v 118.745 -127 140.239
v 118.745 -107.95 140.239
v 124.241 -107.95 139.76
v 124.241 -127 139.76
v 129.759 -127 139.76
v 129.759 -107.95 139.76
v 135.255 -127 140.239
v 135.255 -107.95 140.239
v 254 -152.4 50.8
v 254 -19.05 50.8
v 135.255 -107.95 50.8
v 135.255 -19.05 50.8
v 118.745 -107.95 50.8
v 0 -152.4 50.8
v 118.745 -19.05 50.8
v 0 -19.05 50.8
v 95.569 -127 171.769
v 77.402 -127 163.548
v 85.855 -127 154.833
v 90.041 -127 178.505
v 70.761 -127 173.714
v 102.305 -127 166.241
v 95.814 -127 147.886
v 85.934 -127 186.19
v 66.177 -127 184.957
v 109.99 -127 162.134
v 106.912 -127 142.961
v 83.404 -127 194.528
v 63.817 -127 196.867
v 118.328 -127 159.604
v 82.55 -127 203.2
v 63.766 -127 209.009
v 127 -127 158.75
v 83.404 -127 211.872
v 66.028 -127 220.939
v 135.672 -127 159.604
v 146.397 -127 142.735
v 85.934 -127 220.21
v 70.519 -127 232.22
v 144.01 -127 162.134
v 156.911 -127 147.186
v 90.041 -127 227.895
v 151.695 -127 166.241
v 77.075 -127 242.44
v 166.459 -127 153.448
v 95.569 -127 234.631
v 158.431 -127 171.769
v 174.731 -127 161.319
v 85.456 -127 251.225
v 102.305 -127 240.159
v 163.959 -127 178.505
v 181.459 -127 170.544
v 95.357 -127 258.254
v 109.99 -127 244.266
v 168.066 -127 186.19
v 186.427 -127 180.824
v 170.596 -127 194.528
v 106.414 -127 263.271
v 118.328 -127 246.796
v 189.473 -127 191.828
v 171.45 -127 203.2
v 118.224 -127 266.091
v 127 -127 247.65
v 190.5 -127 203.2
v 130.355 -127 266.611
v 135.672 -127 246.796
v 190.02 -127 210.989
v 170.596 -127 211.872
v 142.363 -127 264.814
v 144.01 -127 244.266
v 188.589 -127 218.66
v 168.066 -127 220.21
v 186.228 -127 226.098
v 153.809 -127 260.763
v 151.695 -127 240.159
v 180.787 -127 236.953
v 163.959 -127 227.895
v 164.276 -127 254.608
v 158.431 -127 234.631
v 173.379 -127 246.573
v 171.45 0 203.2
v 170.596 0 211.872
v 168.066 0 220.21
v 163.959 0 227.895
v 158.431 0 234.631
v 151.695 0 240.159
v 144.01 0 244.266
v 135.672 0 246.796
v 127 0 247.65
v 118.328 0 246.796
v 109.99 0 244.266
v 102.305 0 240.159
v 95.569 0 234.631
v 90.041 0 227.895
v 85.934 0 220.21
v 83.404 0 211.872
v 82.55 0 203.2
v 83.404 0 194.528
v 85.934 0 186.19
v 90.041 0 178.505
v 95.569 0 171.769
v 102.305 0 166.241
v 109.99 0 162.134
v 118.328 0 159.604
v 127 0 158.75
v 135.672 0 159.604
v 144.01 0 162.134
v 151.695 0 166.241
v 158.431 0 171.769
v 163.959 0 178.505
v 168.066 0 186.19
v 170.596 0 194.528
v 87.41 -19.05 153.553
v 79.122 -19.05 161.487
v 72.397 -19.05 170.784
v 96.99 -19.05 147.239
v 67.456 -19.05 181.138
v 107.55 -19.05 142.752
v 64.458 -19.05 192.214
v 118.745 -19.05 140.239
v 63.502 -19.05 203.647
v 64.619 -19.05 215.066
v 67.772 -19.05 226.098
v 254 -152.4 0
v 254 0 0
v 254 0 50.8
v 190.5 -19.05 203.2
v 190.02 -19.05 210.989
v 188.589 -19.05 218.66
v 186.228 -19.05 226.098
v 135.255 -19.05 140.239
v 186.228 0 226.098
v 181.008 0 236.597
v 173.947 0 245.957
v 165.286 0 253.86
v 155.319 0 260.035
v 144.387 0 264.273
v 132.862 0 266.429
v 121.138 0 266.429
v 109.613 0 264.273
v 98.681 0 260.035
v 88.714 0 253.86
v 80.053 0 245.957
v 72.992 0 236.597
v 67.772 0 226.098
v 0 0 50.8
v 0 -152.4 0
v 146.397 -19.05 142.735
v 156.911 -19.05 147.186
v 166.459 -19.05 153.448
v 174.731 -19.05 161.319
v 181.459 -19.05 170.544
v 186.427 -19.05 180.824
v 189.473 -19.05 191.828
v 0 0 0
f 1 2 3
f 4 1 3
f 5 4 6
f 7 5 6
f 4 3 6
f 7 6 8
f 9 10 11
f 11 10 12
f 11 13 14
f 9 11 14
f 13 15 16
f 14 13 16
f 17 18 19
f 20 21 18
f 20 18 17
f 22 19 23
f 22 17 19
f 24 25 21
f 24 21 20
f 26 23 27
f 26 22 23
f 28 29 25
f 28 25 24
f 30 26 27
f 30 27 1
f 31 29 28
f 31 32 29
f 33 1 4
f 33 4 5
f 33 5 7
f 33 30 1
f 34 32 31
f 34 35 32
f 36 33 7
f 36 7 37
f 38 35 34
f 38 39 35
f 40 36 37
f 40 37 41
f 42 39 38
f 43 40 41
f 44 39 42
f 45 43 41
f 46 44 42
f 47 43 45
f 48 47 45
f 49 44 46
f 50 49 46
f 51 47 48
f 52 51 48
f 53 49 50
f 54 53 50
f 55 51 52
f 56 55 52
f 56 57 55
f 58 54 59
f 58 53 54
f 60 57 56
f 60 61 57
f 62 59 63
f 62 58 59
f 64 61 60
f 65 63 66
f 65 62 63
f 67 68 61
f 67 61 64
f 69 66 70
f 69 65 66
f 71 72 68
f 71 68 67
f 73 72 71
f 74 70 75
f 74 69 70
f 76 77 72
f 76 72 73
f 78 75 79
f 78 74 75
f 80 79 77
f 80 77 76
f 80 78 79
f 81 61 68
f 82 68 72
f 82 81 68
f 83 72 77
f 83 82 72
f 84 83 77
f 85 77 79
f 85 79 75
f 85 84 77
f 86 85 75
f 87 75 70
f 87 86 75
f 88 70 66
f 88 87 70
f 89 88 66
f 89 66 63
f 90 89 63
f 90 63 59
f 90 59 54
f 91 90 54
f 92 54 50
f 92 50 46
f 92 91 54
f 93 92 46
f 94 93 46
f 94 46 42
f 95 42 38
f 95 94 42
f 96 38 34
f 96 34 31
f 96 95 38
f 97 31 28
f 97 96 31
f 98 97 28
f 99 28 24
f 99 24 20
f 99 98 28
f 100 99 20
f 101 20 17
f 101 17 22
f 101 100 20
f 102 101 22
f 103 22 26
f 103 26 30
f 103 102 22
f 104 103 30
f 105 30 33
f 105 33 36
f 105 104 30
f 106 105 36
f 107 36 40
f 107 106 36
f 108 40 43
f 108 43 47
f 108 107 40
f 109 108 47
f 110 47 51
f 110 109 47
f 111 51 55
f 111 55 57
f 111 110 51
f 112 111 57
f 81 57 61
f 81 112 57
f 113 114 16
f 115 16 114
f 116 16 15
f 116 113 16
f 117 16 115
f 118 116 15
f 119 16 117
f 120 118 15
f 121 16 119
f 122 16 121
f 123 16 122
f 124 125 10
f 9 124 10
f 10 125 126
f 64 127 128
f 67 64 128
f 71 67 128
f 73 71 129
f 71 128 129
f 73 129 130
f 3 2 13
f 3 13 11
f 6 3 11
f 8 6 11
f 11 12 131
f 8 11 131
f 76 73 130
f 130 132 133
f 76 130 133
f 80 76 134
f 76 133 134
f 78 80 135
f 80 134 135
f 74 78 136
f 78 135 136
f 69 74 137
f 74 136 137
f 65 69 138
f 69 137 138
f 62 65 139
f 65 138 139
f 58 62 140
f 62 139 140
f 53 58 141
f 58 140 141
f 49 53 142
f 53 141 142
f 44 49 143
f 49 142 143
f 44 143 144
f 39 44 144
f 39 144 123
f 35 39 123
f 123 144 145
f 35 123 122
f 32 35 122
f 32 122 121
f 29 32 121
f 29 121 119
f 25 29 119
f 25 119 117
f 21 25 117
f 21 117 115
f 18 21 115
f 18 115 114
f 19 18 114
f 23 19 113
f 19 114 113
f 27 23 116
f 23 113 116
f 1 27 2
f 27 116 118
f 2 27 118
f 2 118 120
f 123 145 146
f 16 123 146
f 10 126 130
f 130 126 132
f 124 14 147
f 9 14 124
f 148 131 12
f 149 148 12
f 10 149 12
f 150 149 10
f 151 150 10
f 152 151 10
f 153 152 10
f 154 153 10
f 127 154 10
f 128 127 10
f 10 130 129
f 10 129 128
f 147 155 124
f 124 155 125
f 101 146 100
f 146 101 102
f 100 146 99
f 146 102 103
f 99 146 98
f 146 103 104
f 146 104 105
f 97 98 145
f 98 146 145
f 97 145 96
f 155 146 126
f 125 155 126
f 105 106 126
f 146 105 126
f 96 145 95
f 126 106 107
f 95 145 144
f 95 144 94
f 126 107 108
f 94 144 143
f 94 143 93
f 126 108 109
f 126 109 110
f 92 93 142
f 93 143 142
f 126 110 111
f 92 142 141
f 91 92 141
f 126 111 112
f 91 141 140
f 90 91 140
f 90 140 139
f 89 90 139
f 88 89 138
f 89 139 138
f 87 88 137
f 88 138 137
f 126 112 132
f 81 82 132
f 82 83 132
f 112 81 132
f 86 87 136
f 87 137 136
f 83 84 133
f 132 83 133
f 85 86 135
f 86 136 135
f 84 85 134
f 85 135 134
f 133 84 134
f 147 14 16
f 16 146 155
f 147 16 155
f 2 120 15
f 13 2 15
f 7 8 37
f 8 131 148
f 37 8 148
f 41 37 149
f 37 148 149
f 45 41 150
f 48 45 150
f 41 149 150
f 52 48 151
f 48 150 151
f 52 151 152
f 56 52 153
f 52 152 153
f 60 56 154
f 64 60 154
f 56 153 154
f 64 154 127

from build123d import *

# Parameters (mm, degrees)
F2_DEPTH = 107.95
F3_DEPTH = 19.05
F4_DEPTH = 19.05
F1_R     = 44.45
F5_DEPTH = 127
F6_DEPTH = 152.4


# Not quite as in the source:
# - a variable given as a bare number and used for a length is read in inches; the dataset says mm whatever the document's units were


with BuildPart() as f2:
    # F1 (on Front) → F2 (new body)
    with BuildSketch(Plane.XZ):
        with BuildLine():
            Line((118.745, 140.2388613905), (118.745, 50.8))
            Line((118.745, 50.8), (135.255, 50.8))
            Line((135.255, 50.8), (135.255, 140.2388613905))
            ThreePointArc((135.255, 140.2388613905), (127, 139.7), (118.745, 140.2388613905))
        make_face()
    extrude(amount=F2_DEPTH)

    # F1 (on Front) → F3 (join)
    with BuildSketch(Plane.XZ):
        with BuildLine():
            Line((135.255, 50.8), (254, 50.8))
            Line((254, 50.8), (186.2277468166, 226.0981223472))
            ThreePointArc((186.2277468166, 226.0981223472), (189.4228000127, 214.8466320699), (190.5, 203.2))
            ThreePointArc((190.5, 203.2), (174.7307160013, 161.3188735825), (135.255, 140.2388613905))
            Line((135.255, 140.2388613905), (135.255, 50.8))
        make_face()
    extrude(amount=F3_DEPTH)

    # F1 (on Front) → F4 (join)
    with BuildSketch(Plane.XZ):
        with BuildLine():
            Line((67.7722531834, 226.0981223472), (0, 50.8))
            Line((0, 50.8), (118.745, 50.8))
            Line((118.745, 50.8), (118.745, 140.2388613905))
            ThreePointArc((118.745, 140.2388613905), (72.3974959138, 170.7836993549), (67.7722531834, 226.0981223472))
        make_face()
    extrude(amount=F4_DEPTH)

    # F1 (on Front) → F5 (join)
    with BuildSketch(Plane.XZ):
        with BuildLine():
            ThreePointArc((186.2277468166, 226.0981223472), (127, 266.7), (67.7722531834, 226.0981223472))
            ThreePointArc((67.7722531834, 226.0981223472), (72.3974959138, 170.7836993549), (118.745, 140.2388613905))
            ThreePointArc((118.745, 140.2388613905), (127, 139.7), (135.255, 140.2388613905))
            ThreePointArc((135.255, 140.2388613905), (174.7307160013, 161.3188735825), (190.5, 203.2))
            ThreePointArc((190.5, 203.2), (189.4228000127, 214.8466320699), (186.2277468166, 226.0981223472))
        make_face()
        with Locations((127, 203.2)):
            Circle(F1_R, mode=Mode.SUBTRACT)
    extrude(amount=F5_DEPTH)

    # F1 (on Front) → F6 (join)
    with BuildSketch(Plane.XZ):
        Polygon((0, 50.8), (0, 0), (254, 0), (254, 50.8), (135.255, 50.8), (118.745, 50.8), align=None)
    extrude(amount=F6_DEPTH)


solid = f2.part
